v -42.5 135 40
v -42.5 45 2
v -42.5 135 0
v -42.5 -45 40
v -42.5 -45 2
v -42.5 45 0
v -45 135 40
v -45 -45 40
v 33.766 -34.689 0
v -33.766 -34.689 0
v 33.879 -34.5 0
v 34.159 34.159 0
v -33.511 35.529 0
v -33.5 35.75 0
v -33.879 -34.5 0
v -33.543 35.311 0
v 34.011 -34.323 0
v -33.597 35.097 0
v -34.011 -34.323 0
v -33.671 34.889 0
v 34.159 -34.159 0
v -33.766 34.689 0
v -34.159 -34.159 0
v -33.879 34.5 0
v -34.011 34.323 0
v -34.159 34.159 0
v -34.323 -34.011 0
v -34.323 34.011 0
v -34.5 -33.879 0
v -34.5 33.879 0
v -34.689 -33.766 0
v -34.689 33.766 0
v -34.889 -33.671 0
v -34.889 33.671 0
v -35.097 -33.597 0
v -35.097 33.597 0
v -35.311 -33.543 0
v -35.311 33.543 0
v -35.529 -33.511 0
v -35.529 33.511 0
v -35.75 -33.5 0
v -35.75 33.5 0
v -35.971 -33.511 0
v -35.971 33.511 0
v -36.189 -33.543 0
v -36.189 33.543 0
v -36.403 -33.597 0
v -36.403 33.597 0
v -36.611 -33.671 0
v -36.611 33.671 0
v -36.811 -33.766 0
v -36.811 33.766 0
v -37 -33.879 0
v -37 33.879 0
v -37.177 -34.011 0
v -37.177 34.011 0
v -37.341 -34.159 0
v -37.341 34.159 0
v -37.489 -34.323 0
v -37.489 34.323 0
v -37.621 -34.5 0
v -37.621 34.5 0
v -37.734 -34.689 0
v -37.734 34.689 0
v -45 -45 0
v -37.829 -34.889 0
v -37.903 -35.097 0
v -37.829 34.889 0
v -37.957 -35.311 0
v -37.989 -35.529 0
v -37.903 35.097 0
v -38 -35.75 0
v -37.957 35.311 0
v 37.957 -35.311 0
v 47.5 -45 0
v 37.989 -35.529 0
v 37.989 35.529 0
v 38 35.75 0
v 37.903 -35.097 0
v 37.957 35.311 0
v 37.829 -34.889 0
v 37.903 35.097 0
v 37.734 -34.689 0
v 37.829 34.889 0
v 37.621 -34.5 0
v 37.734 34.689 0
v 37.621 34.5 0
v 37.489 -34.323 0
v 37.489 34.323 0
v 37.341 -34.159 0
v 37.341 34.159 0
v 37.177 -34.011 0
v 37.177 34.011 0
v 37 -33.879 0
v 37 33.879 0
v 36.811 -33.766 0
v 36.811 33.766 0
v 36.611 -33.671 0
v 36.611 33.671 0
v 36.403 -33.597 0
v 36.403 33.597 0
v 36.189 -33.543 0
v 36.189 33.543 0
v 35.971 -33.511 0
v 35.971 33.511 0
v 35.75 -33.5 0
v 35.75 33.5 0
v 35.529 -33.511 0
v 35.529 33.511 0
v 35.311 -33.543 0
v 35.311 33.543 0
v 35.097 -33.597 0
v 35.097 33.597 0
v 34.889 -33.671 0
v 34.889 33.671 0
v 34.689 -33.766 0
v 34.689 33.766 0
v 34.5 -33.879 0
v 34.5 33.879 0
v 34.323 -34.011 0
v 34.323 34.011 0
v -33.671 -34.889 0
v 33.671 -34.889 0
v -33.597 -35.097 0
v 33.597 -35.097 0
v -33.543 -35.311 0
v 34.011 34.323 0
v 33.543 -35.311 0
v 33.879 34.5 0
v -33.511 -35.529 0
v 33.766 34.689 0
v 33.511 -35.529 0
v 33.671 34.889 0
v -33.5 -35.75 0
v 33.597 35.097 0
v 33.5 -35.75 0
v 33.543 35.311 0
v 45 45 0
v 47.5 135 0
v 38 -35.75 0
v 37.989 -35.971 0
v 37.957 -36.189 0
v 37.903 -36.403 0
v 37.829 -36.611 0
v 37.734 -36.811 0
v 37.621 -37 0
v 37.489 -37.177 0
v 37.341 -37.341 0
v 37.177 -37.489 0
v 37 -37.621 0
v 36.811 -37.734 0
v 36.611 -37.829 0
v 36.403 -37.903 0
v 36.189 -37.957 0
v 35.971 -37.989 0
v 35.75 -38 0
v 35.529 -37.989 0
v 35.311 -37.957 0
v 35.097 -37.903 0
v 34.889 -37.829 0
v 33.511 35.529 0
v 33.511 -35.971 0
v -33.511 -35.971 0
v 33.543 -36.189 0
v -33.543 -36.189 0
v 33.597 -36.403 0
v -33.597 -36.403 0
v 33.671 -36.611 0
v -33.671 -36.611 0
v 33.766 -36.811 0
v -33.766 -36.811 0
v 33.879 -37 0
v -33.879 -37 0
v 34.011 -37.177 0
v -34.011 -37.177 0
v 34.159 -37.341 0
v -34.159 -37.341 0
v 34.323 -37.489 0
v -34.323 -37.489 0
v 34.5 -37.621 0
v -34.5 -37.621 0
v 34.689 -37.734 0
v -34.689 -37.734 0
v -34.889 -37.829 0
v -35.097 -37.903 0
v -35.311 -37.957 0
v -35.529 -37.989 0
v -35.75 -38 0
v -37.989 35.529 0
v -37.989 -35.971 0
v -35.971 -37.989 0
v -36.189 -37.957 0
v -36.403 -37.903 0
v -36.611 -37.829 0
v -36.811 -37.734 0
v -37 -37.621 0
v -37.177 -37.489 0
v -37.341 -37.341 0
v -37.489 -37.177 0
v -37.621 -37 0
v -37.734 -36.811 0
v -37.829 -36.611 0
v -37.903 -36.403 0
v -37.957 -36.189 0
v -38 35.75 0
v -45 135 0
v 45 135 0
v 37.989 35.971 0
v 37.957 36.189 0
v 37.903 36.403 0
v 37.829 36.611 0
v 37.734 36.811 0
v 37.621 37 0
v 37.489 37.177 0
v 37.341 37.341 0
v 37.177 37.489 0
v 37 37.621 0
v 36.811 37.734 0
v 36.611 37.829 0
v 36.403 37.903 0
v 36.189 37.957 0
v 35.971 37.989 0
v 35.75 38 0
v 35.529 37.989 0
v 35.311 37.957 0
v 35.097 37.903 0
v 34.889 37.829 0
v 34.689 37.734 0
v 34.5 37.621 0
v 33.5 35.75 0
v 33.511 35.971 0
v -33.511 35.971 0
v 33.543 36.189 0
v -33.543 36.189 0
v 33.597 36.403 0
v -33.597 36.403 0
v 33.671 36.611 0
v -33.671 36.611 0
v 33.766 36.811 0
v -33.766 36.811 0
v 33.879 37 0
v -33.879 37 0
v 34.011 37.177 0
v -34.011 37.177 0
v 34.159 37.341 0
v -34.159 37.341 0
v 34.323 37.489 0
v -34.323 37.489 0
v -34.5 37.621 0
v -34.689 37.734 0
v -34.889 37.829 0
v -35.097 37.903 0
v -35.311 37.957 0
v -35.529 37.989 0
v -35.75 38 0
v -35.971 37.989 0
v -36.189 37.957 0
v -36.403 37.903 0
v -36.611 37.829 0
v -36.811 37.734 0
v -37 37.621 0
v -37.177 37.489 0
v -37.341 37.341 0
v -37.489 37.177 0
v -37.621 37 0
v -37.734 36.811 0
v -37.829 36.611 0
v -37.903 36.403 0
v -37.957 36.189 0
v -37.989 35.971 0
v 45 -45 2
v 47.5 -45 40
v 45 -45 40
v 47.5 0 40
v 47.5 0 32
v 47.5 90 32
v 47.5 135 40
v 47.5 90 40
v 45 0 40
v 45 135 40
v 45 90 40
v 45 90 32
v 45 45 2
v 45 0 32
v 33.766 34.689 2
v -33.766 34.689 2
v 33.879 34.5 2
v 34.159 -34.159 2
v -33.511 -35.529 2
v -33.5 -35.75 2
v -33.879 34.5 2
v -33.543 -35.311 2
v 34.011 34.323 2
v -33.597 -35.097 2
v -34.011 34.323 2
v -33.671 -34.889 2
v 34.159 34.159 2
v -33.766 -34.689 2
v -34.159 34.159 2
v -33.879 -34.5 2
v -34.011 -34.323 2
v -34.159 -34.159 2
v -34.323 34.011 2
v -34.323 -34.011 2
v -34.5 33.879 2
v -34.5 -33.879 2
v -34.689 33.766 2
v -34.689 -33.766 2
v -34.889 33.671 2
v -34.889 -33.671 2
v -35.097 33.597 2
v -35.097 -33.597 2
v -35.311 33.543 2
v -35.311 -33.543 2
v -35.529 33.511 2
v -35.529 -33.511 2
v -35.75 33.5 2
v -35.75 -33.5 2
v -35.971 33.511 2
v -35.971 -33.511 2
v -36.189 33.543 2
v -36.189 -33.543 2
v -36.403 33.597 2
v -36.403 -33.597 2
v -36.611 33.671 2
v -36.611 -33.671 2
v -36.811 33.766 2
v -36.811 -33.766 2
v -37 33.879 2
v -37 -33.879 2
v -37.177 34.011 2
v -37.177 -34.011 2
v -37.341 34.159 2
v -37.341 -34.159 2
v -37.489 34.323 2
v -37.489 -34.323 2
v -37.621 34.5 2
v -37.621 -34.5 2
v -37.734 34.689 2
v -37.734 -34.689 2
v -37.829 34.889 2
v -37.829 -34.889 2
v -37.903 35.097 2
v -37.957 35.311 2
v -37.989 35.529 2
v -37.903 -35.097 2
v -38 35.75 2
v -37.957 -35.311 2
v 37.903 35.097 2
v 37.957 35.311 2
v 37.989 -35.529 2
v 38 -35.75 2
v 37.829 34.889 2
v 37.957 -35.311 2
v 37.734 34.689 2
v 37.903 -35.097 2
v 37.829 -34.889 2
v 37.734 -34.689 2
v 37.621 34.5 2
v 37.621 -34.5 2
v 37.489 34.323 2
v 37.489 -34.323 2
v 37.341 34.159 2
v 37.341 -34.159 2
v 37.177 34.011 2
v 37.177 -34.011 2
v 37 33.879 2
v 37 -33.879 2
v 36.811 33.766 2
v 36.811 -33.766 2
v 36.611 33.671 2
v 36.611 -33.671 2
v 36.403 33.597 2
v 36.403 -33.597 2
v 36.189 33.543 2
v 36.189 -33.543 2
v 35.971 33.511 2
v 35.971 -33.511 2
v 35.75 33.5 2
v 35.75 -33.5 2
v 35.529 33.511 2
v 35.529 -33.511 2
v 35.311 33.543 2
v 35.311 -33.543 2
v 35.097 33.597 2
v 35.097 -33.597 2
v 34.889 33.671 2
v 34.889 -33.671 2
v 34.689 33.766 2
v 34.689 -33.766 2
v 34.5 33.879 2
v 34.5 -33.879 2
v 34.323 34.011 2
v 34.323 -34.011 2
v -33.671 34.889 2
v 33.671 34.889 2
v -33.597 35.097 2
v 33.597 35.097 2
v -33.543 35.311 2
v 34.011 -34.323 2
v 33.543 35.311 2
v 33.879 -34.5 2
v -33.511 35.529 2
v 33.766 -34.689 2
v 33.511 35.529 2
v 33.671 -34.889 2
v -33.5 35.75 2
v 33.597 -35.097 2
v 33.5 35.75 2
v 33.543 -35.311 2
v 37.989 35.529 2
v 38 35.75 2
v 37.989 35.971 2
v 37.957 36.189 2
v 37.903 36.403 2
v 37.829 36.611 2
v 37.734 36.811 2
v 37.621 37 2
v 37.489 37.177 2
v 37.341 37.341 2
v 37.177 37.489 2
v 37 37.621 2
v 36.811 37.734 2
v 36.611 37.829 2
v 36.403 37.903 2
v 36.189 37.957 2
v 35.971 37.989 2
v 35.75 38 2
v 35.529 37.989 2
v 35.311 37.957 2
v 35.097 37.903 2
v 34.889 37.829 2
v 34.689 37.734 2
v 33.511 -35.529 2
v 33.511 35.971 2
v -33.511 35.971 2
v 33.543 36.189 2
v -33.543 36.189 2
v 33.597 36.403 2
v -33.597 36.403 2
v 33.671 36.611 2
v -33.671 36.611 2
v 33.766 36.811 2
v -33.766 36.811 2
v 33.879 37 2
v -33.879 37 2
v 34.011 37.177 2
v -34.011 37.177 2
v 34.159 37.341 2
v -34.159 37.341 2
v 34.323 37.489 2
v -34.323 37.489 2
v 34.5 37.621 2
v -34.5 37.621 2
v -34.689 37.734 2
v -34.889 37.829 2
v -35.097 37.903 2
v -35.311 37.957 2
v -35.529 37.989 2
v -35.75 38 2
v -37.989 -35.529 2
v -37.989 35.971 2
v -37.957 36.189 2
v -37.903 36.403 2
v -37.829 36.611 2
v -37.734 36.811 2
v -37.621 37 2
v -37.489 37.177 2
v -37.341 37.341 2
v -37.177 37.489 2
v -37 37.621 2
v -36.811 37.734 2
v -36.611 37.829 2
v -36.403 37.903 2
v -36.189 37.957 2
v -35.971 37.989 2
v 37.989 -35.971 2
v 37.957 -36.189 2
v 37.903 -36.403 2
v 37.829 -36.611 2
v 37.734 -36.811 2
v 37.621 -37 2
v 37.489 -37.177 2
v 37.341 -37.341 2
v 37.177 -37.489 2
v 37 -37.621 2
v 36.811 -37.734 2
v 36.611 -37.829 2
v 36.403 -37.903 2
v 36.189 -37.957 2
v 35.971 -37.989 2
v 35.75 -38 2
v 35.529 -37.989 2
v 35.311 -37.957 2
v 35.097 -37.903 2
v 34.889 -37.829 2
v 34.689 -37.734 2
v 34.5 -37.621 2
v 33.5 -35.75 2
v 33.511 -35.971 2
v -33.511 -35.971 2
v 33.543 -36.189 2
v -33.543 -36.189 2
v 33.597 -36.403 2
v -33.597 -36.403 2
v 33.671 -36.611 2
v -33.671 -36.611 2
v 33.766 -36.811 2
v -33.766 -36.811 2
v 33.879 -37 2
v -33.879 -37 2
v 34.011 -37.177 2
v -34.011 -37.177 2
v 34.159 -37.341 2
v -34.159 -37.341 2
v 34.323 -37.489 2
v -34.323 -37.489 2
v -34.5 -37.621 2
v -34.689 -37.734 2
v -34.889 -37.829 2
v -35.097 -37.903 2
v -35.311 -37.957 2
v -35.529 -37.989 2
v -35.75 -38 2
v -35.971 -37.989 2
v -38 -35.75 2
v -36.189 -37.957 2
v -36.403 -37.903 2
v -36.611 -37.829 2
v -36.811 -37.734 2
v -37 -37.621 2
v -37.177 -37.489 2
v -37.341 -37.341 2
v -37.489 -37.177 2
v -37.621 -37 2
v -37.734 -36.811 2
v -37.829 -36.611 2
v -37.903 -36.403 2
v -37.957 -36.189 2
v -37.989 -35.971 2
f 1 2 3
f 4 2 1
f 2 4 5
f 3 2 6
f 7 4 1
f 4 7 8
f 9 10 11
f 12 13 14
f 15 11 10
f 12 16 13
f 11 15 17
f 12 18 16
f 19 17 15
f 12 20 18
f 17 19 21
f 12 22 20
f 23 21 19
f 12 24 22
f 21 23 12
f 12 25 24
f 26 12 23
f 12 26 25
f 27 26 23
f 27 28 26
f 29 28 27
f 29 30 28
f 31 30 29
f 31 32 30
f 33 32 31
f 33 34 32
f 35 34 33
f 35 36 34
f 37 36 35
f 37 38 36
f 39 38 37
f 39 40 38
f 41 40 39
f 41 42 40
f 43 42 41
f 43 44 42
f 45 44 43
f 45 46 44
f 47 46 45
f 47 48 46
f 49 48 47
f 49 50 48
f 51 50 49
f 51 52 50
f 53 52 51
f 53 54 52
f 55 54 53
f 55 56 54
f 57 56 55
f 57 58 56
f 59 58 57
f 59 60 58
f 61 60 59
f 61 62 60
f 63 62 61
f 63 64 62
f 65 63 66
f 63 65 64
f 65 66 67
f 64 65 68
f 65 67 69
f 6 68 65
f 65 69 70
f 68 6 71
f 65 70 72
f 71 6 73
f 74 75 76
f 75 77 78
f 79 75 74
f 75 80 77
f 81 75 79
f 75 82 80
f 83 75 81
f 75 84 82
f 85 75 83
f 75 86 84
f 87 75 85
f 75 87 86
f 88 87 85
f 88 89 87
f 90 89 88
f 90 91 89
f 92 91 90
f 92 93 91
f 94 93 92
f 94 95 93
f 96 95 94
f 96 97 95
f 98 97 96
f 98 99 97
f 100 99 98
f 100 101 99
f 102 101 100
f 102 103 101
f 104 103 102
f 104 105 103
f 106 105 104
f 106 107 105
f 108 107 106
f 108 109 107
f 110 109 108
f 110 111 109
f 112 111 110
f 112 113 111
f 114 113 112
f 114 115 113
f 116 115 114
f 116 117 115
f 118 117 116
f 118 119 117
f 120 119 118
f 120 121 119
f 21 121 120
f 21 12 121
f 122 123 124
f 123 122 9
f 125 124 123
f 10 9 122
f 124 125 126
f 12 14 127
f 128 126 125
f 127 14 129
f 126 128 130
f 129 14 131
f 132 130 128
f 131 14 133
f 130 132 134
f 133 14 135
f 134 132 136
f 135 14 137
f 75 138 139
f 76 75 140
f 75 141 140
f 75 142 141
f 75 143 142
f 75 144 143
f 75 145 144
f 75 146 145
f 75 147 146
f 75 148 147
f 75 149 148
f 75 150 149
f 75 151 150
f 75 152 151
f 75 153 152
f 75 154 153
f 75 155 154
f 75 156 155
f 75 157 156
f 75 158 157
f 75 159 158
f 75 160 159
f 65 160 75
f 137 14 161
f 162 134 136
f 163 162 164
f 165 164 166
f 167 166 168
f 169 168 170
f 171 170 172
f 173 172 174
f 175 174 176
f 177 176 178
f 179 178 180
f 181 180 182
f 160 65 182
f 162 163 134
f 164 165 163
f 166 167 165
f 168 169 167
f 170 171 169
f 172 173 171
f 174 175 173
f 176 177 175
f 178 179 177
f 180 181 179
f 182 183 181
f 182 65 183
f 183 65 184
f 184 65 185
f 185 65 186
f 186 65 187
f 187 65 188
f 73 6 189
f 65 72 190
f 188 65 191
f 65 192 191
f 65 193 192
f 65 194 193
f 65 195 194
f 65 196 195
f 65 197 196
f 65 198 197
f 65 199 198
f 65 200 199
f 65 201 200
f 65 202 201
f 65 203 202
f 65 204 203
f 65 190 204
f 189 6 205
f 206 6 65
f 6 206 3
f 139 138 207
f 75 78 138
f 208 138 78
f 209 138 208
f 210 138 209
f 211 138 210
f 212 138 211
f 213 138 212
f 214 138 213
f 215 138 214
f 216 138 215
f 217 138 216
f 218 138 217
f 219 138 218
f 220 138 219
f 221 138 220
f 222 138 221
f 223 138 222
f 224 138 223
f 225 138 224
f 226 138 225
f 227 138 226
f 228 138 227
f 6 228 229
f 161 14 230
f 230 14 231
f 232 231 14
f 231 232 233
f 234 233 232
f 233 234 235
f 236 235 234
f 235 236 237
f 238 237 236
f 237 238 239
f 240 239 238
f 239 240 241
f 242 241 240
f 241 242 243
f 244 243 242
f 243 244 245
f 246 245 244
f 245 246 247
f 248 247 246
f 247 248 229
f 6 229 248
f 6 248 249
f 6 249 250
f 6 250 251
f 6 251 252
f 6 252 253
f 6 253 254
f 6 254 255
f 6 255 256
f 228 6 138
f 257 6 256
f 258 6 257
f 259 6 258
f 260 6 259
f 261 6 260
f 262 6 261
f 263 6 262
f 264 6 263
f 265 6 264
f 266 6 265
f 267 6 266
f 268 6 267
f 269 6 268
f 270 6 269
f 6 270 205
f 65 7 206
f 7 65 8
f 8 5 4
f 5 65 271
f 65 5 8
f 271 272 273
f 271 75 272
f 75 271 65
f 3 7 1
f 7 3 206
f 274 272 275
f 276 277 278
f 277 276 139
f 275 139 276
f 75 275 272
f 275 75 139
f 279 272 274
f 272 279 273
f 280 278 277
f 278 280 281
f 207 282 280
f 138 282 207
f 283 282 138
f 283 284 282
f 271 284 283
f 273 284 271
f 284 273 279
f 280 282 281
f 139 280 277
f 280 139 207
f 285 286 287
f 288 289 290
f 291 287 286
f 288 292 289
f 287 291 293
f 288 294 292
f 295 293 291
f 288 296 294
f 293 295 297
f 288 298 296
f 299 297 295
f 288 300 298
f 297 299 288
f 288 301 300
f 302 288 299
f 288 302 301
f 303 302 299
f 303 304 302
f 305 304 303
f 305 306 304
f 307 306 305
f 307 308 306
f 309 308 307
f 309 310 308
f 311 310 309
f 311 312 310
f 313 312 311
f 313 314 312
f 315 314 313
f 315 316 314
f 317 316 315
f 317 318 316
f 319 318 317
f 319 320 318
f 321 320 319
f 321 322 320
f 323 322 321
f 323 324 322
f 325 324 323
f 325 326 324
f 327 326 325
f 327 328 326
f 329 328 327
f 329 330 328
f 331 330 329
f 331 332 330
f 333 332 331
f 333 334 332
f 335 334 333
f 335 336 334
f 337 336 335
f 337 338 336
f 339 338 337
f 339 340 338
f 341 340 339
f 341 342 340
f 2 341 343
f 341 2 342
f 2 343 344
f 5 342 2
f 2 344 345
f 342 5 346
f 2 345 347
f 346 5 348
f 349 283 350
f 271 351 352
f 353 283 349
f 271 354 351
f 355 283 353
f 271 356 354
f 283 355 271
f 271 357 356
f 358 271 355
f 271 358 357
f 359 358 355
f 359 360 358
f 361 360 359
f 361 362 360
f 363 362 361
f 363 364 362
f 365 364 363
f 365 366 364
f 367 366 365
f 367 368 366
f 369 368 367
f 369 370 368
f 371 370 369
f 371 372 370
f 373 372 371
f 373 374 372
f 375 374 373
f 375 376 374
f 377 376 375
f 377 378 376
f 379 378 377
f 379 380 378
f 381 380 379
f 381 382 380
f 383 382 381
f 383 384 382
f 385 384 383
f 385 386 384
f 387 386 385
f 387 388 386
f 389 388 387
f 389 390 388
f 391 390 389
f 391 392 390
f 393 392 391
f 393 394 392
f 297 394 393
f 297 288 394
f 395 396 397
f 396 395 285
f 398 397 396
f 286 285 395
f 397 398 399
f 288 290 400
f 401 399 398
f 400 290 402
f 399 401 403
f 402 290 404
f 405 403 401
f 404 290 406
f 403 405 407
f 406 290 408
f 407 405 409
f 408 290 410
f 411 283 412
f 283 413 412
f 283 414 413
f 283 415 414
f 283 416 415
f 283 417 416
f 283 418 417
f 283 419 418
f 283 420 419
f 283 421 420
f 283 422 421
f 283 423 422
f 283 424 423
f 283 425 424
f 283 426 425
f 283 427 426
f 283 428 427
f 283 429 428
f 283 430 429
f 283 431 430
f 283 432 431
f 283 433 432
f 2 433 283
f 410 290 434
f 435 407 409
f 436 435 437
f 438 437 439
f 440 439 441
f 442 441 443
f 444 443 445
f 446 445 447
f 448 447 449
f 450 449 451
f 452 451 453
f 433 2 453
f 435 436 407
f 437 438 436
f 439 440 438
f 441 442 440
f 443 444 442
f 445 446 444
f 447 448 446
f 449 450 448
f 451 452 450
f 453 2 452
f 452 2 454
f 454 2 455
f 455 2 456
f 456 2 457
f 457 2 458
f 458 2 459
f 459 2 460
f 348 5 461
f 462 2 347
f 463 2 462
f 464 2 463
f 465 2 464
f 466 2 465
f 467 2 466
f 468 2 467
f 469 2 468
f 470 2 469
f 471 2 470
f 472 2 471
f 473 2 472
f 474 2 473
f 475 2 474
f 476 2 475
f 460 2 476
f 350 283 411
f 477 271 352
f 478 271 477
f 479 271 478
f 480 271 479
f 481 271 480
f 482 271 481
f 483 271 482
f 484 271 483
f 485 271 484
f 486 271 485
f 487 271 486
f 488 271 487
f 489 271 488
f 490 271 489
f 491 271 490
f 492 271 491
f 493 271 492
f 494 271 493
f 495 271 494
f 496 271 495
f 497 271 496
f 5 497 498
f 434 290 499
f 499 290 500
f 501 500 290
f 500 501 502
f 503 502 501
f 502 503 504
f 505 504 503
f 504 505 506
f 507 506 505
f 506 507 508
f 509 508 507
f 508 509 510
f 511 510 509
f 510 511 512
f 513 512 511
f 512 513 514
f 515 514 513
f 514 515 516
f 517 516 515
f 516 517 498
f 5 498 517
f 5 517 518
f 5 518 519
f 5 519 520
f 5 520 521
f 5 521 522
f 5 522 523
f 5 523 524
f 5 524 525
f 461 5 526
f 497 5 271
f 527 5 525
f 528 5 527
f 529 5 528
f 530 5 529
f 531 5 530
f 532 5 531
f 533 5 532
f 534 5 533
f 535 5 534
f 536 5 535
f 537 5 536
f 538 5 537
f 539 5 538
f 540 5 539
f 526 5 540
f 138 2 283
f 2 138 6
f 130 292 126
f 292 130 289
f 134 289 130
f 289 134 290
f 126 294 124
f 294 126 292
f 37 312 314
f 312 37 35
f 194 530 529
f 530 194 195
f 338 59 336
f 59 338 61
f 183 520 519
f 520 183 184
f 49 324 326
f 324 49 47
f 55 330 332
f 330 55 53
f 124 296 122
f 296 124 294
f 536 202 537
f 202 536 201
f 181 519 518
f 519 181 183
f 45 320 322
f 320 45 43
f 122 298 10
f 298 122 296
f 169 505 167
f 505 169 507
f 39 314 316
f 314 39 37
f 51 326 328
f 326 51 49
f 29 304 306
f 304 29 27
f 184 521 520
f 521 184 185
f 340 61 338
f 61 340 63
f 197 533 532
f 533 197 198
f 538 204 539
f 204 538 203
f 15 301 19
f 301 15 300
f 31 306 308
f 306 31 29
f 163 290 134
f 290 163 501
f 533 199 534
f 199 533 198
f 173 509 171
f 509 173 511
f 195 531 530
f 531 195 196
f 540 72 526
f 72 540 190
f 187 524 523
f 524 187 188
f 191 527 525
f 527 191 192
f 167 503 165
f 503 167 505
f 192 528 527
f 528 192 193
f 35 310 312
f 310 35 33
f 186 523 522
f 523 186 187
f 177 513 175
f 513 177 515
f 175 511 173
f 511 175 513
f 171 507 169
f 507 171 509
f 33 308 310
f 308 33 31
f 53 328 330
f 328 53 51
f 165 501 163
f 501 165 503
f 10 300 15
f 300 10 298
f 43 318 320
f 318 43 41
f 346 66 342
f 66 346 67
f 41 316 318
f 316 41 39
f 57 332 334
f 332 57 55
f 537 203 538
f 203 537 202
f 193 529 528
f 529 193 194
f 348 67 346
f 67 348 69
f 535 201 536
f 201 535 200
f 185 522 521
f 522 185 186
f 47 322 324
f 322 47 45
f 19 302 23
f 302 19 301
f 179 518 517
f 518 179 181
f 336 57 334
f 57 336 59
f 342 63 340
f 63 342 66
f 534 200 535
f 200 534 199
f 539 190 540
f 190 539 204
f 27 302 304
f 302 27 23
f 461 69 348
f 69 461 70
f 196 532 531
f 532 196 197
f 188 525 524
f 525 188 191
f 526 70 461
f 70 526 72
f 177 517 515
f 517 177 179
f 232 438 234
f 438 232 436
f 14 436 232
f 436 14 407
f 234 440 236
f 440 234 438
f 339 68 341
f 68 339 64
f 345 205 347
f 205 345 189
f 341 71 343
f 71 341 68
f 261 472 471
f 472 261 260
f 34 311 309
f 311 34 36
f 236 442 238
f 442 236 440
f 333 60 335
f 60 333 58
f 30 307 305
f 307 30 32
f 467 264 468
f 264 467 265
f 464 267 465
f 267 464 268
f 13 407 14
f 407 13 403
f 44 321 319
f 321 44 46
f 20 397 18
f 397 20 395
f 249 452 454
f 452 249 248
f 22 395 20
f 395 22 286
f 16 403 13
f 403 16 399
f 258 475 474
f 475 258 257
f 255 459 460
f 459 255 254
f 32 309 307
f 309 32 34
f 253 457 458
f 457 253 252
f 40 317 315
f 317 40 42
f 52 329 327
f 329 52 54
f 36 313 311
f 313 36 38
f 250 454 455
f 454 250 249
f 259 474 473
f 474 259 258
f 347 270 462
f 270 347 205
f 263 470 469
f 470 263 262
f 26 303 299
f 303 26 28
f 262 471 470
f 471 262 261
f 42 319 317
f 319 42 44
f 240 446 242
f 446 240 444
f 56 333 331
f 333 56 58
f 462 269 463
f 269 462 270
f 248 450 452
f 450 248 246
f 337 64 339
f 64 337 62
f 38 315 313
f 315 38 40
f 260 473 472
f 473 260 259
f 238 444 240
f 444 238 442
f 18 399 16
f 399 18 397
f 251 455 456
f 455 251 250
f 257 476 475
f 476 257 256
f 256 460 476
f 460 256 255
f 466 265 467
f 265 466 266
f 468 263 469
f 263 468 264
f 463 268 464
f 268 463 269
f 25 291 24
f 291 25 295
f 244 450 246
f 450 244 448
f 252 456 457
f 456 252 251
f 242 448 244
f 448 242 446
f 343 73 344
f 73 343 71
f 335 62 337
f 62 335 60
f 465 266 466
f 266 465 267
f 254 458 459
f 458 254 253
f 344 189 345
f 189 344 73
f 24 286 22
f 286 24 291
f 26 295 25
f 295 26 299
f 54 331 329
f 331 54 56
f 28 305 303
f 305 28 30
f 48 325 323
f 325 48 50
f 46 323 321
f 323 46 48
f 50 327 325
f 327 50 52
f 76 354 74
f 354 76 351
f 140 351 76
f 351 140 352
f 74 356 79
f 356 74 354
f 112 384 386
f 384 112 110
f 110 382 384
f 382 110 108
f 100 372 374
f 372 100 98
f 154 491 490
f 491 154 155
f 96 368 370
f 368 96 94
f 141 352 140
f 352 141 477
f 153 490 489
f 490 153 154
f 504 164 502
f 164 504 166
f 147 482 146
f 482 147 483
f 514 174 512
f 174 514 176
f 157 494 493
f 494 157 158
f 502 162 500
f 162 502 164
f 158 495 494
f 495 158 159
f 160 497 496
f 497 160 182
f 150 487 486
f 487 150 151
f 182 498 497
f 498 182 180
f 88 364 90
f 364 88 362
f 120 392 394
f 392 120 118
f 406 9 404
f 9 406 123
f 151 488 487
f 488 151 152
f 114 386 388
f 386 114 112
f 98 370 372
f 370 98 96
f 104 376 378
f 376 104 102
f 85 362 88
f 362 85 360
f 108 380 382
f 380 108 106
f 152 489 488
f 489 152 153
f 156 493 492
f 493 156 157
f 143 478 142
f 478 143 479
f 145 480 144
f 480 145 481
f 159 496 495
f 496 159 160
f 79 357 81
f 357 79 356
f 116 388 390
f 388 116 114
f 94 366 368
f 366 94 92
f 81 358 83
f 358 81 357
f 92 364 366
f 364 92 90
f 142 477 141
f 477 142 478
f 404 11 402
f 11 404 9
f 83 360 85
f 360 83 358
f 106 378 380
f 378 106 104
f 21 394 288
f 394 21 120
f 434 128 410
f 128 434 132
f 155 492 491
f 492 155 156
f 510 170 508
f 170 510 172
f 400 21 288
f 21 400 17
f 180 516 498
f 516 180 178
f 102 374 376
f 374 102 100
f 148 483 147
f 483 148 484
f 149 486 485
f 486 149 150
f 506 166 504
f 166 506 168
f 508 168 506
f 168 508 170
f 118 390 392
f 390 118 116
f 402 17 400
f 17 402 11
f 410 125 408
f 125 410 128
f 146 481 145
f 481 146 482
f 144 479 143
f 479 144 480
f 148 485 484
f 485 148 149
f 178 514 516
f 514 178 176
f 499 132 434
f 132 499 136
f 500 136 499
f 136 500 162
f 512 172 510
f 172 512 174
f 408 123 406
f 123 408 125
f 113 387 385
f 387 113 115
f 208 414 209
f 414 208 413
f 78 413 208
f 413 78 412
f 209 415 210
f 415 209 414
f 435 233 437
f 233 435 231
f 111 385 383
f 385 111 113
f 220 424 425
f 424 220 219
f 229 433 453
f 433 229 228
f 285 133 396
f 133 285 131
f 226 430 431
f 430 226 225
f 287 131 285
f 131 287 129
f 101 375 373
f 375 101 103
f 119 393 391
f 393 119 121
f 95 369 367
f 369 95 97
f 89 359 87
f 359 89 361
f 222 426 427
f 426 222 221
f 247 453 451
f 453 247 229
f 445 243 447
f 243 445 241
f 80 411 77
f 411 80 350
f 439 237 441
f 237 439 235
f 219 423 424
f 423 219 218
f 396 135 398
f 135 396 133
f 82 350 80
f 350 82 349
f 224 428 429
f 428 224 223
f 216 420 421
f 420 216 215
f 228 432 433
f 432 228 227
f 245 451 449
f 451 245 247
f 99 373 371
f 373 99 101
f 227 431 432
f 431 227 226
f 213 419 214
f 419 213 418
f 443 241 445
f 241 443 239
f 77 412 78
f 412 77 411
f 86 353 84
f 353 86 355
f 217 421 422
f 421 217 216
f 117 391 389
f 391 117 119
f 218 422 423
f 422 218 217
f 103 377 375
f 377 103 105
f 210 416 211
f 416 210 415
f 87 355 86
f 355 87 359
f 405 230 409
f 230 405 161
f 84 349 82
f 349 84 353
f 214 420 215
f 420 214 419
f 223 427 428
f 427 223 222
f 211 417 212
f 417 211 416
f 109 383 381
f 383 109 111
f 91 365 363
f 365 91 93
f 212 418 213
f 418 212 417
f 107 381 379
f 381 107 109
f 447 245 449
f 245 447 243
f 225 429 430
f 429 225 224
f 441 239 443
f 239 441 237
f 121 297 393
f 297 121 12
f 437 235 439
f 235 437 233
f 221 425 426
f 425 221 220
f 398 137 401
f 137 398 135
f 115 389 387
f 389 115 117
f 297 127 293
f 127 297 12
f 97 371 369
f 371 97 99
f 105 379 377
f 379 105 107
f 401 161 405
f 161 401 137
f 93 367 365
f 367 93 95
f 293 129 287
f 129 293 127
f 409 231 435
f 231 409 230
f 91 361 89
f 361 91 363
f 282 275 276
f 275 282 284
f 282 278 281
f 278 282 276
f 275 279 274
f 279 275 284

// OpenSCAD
// Housing for a DIY magnetic stirrer built from an 80 mm PC case fan
// Printed upside down: top plate on the bed, box open at the top.

$fn = 64;

// ---- Dimensions (mm) ----
housing_outer  = 90;    // housing outer size (X x Y)
top_thick      = 2;     // top plate thickness (z = 0 to 2)
wall_thick     = 2.5;   // wall thickness
box_height     = 40;    // total height of box walls (open top at z = 40)
screw_pitch    = 71.5;  // square pitch of M4 screw holes
screw_d        = 4.5;   // M4 screw hole diameter
cable_w        = 12;    // cable notch width
cable_reach    = 8;     // notch depth from open edge (z = 32 to 40)

eps            = 0.5;   // cutter overshoot past faces

difference() {
    union() {
        // Top plate
        translate([-housing_outer/2, -housing_outer/2, 0])
            cube([housing_outer, housing_outer, top_thick]);
        // Four walls
        for (x = [-1, 1])
            for (y = [-1, 1])
                translate([x*housing_outer/2, y*housing_outer/2, 0])
                    cube([wall_thick, housing_outer, box_height]);
    }

    // M4 screw holes through top plate
    for (x = [-1, 1])
        for (y = [-1, 1])
            translate([x*screw_pitch/2, y*screw_pitch/2, -eps])
                cylinder(d = screw_d, h = top_thick + 2*eps);

    // Cable notch in one wall (X+ wall), centred along the wall
    translate([housing_outer/2, 0, box_height - cable_reach])
        cube([cable_w, housing_outer, cable_reach + eps]);
}
